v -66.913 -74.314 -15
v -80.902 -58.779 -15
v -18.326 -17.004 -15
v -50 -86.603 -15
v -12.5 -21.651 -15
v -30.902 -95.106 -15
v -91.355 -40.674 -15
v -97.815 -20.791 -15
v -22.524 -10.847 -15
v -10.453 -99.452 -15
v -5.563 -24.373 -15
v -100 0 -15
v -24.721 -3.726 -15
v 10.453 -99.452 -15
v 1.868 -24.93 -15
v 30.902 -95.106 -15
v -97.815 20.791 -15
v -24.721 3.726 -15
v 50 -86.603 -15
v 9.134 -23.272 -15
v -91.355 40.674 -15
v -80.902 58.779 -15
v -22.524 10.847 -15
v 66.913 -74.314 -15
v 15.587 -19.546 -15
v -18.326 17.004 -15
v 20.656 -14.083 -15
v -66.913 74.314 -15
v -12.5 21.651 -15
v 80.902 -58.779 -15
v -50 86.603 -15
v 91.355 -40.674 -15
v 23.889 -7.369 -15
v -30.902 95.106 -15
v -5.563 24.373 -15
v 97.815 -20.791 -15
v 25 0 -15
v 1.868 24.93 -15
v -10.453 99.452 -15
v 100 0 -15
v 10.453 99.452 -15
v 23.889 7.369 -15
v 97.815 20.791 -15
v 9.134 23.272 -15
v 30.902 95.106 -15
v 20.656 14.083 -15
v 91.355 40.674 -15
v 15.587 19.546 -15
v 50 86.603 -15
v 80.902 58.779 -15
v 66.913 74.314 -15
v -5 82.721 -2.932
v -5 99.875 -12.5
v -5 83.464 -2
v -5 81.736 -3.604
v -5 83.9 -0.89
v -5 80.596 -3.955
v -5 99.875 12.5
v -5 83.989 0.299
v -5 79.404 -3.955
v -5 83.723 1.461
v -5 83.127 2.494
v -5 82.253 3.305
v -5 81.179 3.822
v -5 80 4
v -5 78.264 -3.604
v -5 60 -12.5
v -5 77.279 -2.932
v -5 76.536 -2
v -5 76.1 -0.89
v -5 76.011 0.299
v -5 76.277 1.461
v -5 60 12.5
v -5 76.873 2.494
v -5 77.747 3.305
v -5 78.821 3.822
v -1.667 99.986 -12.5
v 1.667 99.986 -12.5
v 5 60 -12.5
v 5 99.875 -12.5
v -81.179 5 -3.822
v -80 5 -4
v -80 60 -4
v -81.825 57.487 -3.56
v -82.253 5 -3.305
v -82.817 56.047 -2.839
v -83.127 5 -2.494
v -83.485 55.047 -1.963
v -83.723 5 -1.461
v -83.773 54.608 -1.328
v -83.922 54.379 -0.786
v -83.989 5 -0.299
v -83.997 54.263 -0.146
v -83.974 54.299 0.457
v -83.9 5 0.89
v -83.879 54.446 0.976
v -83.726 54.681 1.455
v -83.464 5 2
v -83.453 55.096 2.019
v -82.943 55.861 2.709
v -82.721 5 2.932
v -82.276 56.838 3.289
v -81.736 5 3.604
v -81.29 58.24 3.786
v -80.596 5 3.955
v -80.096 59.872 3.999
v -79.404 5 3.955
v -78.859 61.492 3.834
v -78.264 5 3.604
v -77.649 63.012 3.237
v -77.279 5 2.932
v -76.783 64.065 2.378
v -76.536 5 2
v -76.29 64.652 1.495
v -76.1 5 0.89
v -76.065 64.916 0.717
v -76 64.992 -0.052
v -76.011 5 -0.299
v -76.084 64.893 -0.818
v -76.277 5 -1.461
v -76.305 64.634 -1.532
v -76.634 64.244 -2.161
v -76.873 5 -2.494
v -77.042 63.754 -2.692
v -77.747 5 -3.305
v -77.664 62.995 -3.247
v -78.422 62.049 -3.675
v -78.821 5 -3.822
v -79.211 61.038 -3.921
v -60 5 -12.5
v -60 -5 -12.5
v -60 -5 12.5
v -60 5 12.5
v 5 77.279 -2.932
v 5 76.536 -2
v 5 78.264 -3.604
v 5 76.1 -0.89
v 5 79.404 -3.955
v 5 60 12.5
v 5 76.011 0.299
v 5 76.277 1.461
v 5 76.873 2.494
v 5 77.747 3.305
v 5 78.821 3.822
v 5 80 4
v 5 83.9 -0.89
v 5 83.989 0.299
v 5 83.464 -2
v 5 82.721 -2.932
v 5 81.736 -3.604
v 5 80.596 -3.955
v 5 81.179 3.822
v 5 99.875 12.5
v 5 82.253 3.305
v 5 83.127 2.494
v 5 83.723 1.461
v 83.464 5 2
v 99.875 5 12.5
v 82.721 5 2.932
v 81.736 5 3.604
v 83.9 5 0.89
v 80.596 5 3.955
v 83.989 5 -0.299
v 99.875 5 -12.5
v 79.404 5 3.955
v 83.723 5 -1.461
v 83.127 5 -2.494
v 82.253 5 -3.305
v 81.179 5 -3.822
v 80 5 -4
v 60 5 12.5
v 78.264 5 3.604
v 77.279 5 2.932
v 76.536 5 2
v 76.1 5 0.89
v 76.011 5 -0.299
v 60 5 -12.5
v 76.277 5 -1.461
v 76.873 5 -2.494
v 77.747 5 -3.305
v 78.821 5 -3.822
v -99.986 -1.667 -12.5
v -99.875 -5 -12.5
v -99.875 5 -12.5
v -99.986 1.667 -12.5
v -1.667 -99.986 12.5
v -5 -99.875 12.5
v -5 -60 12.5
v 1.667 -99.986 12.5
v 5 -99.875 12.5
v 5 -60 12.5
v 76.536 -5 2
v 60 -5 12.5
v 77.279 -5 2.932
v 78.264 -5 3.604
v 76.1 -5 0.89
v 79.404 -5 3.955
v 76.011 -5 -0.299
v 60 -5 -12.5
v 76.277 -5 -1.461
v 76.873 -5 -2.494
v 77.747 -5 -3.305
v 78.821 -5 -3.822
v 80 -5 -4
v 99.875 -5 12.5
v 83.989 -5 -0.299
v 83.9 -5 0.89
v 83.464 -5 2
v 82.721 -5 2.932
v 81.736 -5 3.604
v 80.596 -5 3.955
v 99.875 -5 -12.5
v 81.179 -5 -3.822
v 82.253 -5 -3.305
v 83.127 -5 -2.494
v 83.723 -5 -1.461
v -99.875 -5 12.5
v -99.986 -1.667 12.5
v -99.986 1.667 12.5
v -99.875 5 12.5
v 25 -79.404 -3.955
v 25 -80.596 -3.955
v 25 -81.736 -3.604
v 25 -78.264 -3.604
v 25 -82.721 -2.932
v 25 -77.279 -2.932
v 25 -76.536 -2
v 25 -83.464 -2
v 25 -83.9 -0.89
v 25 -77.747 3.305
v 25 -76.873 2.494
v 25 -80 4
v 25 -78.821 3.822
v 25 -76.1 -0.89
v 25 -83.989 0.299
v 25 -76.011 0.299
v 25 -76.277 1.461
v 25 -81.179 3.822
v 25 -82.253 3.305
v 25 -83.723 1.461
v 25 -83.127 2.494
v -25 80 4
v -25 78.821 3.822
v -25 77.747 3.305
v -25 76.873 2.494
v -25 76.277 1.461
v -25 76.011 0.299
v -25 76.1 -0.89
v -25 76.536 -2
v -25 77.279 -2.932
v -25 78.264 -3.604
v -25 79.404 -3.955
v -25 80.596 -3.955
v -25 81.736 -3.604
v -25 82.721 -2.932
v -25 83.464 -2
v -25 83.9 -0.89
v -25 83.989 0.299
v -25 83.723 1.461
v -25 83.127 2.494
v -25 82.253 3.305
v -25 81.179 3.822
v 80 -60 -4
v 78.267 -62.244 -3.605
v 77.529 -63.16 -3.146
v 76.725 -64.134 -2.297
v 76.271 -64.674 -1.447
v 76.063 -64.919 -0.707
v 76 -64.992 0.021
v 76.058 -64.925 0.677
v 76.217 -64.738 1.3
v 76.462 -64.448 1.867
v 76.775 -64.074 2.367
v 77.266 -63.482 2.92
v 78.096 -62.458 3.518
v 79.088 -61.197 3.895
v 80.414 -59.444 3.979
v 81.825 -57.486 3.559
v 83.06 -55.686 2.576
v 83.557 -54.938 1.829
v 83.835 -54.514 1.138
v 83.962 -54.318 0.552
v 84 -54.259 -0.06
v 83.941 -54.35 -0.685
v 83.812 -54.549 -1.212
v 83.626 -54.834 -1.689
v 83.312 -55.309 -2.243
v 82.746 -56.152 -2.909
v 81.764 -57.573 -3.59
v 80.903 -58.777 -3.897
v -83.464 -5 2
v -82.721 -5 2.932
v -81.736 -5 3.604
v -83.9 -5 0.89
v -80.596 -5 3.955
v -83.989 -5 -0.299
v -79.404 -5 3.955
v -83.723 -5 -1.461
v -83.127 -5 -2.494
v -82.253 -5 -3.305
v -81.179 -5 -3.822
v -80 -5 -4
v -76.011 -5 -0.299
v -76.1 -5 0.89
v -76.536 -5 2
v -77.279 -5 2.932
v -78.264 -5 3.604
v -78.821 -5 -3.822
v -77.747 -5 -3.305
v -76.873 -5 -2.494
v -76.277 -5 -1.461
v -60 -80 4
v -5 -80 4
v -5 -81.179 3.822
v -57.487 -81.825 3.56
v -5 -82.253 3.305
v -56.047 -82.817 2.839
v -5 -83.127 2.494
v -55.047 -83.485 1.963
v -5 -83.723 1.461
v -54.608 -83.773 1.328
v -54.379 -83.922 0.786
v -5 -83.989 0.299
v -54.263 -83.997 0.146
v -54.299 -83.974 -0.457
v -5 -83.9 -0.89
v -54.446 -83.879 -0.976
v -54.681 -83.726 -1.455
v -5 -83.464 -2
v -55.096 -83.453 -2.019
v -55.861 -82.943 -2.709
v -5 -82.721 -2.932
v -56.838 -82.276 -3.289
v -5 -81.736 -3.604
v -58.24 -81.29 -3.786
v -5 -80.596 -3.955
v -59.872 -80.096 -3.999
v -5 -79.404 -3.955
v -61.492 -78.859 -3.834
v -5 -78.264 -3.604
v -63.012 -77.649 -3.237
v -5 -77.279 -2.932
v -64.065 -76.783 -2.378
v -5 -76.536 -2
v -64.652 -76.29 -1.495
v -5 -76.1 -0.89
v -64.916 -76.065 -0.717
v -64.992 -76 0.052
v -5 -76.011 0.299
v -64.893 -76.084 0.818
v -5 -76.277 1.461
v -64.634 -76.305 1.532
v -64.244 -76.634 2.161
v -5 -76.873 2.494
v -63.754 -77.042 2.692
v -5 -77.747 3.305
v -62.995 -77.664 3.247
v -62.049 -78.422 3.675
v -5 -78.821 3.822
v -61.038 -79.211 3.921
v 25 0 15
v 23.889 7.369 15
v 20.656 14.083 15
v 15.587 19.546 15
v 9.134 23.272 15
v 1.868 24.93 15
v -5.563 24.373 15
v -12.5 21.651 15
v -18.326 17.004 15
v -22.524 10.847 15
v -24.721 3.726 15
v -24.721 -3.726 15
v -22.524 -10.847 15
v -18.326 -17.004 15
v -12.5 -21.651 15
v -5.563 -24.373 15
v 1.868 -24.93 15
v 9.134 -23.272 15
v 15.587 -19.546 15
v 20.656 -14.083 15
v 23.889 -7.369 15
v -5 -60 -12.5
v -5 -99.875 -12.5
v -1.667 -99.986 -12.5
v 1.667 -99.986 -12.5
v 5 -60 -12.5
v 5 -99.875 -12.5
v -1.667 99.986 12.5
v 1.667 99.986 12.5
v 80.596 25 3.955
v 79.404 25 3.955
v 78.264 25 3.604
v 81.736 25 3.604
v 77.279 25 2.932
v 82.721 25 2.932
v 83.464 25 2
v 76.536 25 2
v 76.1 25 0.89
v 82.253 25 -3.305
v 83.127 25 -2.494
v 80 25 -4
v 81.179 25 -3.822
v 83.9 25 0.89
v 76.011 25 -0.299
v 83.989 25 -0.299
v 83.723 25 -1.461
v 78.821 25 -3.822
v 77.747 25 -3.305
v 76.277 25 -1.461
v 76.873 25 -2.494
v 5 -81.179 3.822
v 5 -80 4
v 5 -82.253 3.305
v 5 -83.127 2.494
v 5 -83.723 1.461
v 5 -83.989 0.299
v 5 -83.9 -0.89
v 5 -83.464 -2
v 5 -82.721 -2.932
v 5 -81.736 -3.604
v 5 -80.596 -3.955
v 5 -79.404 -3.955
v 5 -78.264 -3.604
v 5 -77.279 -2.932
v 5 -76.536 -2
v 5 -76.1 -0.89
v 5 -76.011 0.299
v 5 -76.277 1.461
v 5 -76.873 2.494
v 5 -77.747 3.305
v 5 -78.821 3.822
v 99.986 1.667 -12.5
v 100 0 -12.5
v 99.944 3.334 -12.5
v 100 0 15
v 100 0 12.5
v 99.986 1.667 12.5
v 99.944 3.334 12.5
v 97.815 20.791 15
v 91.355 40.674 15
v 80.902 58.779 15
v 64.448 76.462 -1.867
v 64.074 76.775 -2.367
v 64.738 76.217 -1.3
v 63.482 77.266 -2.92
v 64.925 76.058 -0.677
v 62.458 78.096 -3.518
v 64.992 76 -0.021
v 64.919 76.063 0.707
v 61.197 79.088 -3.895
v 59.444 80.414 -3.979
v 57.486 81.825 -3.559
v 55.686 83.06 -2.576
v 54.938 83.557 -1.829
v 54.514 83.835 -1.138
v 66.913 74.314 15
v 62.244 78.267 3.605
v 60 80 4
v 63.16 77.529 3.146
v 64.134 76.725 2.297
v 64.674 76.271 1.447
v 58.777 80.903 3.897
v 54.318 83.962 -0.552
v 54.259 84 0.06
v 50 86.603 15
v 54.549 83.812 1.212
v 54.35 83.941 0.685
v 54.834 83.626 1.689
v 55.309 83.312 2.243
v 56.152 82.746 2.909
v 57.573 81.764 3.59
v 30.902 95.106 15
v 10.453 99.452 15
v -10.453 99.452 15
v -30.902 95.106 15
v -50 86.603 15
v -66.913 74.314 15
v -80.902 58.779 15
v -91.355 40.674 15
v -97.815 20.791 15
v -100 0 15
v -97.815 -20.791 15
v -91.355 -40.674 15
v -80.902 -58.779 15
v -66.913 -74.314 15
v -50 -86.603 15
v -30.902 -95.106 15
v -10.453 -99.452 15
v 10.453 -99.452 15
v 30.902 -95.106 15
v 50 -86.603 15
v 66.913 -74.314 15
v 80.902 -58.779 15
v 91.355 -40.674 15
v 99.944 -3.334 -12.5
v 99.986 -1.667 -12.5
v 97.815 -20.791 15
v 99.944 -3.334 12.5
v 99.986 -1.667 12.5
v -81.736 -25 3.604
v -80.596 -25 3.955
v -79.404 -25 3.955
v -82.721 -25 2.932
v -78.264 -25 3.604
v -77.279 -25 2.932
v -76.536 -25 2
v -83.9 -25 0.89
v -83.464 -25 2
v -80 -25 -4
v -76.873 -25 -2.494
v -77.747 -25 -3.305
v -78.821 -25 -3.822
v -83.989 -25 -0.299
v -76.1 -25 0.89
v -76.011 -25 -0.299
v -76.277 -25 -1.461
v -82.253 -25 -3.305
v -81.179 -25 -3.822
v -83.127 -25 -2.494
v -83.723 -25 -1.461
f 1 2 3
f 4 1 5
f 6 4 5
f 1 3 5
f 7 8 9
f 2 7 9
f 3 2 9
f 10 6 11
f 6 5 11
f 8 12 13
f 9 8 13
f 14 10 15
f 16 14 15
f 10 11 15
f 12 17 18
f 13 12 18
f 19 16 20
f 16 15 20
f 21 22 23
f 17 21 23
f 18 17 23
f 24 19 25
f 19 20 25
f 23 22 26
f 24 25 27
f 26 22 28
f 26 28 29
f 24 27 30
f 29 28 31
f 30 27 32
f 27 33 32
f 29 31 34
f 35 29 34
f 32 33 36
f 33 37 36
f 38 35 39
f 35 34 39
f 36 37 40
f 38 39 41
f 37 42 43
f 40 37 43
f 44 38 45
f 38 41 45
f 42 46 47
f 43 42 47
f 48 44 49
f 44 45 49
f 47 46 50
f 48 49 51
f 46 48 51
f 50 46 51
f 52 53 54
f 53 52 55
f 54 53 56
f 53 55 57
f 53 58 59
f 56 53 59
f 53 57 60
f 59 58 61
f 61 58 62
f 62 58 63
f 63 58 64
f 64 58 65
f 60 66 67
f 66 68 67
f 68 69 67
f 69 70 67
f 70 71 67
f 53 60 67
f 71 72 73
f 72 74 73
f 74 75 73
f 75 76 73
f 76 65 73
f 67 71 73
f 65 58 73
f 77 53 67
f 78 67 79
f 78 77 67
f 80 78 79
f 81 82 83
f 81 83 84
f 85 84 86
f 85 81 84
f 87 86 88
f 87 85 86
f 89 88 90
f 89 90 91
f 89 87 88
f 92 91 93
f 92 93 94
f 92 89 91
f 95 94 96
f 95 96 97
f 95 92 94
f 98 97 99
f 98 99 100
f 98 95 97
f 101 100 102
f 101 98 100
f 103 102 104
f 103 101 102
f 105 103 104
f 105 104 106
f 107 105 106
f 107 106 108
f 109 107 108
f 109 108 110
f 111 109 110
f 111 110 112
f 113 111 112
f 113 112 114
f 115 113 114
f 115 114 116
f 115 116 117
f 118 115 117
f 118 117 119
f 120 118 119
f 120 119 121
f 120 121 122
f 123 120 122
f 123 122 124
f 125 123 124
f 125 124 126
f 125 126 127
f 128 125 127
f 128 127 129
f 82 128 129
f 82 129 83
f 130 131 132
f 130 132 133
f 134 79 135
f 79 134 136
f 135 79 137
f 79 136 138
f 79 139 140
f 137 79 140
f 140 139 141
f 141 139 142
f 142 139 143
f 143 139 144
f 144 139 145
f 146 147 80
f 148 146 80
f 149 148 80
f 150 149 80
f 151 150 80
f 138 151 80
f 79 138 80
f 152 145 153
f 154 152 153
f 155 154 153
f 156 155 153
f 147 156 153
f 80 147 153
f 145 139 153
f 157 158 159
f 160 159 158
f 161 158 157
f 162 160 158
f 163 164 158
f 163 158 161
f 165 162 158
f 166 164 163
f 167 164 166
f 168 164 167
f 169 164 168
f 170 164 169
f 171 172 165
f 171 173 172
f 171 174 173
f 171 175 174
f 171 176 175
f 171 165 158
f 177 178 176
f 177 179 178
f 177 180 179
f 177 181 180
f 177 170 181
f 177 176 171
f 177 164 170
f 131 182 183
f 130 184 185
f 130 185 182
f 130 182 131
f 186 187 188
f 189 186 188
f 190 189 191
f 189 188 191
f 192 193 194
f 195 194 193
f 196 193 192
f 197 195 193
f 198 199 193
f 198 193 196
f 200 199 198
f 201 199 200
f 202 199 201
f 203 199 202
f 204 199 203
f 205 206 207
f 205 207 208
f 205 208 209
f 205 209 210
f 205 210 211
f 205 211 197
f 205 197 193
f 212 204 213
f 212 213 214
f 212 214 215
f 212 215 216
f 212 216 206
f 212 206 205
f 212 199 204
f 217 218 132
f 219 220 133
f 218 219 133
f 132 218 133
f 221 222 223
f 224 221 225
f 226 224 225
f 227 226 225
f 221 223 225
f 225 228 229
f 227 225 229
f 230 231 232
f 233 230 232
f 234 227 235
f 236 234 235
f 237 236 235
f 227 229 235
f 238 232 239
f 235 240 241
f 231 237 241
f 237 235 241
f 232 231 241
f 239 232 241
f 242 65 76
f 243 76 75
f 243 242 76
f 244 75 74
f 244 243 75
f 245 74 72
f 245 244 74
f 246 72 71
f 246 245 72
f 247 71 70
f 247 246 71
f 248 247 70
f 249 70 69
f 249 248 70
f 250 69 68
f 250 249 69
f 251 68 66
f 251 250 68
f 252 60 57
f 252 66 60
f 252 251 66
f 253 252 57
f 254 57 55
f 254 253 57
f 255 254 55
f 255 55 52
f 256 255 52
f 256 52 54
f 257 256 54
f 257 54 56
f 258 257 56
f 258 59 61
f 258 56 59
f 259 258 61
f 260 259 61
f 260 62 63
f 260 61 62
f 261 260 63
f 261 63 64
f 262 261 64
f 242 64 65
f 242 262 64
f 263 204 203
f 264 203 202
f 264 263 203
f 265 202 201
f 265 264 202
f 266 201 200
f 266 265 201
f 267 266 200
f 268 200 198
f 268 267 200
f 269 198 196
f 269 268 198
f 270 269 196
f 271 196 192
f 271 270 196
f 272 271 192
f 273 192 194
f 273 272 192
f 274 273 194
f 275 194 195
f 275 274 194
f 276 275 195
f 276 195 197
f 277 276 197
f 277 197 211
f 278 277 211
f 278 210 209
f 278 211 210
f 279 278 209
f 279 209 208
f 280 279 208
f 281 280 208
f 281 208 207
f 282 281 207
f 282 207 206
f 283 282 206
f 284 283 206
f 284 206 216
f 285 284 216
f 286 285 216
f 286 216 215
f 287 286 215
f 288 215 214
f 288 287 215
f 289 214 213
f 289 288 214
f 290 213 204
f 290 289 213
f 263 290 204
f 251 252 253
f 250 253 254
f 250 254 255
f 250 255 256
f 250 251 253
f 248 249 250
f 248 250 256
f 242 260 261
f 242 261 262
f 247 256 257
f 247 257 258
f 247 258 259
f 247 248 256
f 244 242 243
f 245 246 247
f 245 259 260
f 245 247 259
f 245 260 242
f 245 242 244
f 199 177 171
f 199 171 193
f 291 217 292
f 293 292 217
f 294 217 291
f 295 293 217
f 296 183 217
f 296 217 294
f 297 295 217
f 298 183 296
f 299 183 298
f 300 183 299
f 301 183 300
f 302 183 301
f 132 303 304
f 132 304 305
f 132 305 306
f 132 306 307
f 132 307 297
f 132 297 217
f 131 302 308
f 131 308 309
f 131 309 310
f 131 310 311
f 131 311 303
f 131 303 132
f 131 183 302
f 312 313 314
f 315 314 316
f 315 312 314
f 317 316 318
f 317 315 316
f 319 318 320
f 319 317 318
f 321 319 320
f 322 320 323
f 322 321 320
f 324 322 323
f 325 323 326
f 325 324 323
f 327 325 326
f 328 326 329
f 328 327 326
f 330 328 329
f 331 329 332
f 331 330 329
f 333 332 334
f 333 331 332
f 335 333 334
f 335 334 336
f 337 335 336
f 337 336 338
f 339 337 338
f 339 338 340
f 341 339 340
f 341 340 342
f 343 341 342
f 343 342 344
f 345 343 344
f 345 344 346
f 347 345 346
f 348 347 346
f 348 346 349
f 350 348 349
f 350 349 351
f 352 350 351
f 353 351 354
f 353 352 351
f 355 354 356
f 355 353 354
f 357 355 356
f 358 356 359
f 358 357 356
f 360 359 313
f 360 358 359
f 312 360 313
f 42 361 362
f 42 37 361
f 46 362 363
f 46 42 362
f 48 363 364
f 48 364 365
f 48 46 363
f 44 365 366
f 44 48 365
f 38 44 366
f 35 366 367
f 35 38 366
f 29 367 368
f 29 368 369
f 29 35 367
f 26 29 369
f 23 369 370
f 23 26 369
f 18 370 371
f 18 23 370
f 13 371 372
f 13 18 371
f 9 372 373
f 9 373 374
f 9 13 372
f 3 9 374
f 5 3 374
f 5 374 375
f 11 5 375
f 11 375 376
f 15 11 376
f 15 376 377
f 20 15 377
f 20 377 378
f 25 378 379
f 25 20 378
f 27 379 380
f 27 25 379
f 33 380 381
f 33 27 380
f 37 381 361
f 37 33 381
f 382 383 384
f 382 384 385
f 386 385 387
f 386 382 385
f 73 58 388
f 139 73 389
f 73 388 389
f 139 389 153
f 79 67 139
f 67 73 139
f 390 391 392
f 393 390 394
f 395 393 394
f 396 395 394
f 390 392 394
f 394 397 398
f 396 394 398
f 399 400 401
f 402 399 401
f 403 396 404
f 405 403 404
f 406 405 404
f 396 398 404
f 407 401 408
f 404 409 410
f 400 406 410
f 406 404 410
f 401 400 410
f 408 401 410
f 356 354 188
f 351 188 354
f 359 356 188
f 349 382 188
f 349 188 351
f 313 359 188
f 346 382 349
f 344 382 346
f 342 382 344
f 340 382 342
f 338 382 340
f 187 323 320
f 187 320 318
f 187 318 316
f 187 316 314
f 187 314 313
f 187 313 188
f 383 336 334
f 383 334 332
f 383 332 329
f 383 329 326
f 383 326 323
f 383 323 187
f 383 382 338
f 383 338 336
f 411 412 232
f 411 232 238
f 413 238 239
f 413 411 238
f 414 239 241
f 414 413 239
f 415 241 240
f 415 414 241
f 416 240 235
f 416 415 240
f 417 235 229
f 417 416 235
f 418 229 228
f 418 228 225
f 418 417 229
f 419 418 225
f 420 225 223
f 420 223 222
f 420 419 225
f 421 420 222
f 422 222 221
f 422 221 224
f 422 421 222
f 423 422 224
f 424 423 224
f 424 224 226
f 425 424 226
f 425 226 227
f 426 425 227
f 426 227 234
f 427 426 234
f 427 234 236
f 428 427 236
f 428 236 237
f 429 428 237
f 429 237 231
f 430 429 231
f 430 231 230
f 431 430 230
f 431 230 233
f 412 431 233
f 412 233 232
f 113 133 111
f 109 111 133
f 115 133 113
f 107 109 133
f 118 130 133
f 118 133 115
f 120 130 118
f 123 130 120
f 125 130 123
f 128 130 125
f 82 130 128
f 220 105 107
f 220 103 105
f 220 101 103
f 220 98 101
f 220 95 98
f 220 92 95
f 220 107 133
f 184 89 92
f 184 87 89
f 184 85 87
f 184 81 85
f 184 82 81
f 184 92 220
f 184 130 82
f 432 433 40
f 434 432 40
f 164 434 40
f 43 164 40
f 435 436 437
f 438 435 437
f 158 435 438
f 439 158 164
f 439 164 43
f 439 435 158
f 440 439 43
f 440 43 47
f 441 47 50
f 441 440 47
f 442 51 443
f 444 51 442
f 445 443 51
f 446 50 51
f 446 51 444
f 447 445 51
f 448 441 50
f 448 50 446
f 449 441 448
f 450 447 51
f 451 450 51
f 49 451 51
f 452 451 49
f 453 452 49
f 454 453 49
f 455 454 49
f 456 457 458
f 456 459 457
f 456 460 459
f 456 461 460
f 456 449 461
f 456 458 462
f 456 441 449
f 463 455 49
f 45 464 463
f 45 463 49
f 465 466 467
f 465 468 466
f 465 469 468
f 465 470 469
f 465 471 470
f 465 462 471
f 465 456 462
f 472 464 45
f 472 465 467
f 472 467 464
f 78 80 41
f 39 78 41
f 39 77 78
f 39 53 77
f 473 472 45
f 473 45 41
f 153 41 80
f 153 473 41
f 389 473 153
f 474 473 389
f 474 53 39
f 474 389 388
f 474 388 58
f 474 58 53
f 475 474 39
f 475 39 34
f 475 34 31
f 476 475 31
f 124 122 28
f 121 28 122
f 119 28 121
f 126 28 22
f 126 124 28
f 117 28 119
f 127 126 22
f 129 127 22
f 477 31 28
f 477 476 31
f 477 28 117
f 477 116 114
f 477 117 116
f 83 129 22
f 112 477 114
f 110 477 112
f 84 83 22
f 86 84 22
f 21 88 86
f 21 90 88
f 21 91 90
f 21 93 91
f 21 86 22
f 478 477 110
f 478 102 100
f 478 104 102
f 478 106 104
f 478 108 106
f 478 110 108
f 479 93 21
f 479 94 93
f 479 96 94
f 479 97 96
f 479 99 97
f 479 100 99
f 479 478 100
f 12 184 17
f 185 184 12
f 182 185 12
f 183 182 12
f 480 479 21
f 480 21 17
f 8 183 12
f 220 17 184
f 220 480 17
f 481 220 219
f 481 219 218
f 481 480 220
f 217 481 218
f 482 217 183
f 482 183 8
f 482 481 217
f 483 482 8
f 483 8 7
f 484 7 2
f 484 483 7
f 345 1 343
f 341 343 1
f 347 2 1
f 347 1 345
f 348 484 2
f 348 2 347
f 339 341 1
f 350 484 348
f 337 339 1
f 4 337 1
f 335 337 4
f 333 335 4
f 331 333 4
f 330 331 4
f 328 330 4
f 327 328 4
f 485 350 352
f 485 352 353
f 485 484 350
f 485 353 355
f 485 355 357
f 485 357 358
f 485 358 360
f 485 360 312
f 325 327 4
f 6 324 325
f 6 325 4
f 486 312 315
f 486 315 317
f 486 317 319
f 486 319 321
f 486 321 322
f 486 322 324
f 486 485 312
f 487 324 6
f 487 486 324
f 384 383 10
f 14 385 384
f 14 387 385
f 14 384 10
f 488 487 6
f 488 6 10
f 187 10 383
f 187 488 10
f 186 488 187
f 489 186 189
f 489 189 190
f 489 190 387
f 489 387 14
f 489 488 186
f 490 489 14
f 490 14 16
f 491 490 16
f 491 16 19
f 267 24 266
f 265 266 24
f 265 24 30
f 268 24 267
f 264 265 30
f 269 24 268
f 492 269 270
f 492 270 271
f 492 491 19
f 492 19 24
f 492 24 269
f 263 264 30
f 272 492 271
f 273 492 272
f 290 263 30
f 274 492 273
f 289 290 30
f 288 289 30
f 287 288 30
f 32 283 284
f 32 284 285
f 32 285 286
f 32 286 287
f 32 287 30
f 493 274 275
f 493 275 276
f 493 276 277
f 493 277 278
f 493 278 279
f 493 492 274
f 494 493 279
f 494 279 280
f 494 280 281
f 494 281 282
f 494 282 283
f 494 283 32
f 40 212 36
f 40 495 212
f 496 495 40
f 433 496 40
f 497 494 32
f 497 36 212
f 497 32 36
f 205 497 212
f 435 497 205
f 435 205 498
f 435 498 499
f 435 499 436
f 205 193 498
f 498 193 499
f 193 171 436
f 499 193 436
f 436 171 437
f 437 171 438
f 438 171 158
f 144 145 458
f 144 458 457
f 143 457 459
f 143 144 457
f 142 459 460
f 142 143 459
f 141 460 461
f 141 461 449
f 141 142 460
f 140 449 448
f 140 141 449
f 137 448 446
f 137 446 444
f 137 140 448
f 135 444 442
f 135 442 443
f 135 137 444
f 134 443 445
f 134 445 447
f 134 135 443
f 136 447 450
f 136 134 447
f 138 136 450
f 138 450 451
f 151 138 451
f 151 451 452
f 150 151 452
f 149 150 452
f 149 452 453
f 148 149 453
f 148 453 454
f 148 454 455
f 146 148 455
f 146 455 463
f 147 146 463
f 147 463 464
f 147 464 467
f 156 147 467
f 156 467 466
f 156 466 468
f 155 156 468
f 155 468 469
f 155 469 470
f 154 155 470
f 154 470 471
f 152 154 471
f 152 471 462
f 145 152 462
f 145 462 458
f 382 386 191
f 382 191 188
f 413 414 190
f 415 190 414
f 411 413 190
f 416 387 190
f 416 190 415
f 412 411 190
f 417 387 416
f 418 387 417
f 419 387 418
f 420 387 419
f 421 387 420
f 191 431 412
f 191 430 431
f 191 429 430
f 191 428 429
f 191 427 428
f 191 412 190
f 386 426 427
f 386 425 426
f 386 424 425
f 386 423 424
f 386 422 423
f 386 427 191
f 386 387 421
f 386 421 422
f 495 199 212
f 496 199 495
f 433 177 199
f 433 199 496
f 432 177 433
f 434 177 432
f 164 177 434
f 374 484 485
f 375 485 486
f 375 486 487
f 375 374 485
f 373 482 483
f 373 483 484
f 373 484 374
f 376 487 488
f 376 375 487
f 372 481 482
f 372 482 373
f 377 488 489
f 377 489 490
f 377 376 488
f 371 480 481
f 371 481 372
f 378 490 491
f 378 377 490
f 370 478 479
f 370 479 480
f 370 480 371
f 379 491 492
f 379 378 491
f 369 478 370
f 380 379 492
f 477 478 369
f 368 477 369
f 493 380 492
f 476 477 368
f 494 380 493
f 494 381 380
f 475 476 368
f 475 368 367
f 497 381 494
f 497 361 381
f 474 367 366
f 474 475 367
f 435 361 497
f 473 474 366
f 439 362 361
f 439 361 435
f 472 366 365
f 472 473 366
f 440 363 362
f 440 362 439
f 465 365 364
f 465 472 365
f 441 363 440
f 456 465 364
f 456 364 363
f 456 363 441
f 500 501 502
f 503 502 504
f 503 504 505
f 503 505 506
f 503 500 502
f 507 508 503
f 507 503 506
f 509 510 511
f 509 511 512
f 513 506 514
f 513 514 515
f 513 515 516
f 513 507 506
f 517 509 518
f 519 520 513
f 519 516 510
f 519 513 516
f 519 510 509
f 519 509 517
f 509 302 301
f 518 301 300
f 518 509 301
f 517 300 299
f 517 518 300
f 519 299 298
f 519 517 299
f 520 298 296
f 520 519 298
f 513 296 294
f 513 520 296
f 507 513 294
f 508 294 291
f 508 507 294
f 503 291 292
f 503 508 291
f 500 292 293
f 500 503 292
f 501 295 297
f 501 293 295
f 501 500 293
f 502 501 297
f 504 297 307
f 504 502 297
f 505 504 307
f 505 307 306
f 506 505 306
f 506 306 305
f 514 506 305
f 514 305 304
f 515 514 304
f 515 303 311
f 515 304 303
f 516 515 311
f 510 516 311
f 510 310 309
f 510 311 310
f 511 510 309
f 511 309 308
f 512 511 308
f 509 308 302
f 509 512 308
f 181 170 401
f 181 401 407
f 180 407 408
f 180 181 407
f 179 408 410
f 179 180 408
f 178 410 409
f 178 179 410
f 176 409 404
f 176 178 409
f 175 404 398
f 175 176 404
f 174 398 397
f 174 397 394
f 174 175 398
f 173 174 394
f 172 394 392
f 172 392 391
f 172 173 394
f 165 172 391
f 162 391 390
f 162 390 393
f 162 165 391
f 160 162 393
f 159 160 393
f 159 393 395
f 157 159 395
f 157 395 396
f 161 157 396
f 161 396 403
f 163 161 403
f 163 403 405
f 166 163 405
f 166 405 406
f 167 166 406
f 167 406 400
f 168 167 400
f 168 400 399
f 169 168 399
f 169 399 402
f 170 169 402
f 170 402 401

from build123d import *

# Parameters (mm, degrees)
SKETCH1_R               = 100
SKETCH1_R_2             = 25
BOSS_EXTRUDE1_DEPTH     = 15
CUT_EXTRUDE1_DEPTH      = 12.5
CUT_EXTRUDE2_DEPTH      = 25
CUT_EXTRUDE2_DEPTH_BACK = 100
SKETCH3_R               = 4
CUT_EXTRUDE3_DEPTH      = 100
CUT_EXTRUDE3_DEPTH_BACK = 25
SKETCH4_R               = 4
CUT_EXTRUDE4_DEPTH      = 25
CUT_EXTRUDE4_DEPTH_BACK = 100
SKETCH5_R               = 4
CUT_EXTRUDE5_DEPTH      = 100
CUT_EXTRUDE5_DEPTH_BACK = 25
SKETCH6_R               = 4


with BuildPart() as part:
    # Sketch1 → Boss-Extrude1 (new, symmetric)
    with BuildSketch(Plane.XY):
        Circle(SKETCH1_R)
        Circle(SKETCH1_R_2, mode=Mode.SUBTRACT)
    extrude(amount=BOSS_EXTRUDE1_DEPTH, both=True)

    # Sketch2 → Cut-Extrude1 (cut, symmetric)
    with BuildSketch(Plane.XY):
        Polygon((60, -5), (110, -5), (100, 5), (60, 5), align=None)
        Polygon((-5, -60), (-5, -110), (5, -100), (5, -60), align=None)
        Polygon((-60, 5), (-110, 5), (-100, -5), (-60, -5), align=None)
        Polygon((5, 60), (5, 110), (-5, 100), (-5, 60), align=None)
    extrude(amount=CUT_EXTRUDE1_DEPTH, both=True, mode=Mode.SUBTRACT)

    # Sketch3 → Cut-Extrude2 (cut, two sides: drawn at the far end of the back side and taken through both)
    with BuildSketch(Plane(origin=(0, 0, 0), x_dir=(1, 0, 0), z_dir=(0, 1, 0)).offset(-CUT_EXTRUDE2_DEPTH_BACK)):
        with Locations(Location((80, 0, 0), (0, 0, 90))):
            Circle(SKETCH3_R)
    extrude(amount=CUT_EXTRUDE2_DEPTH + CUT_EXTRUDE2_DEPTH_BACK, mode=Mode.SUBTRACT)

    # Sketch4 → Cut-Extrude3 (cut, two sides: drawn at the far end of the back side and taken through both)
    with BuildSketch(Plane(origin=(0, 0, 0), x_dir=(0, 0, -1), z_dir=(1, 0, 0)).offset(-CUT_EXTRUDE3_DEPTH_BACK)):
        with Locations(Location((0, 80, 0), (0, 0, 180))):
            Circle(SKETCH4_R)
    extrude(amount=CUT_EXTRUDE3_DEPTH + CUT_EXTRUDE3_DEPTH_BACK, mode=Mode.SUBTRACT)

    # Sketch5 → Cut-Extrude4 (cut, two sides: drawn at the far end of the back side and taken through both)
    with BuildSketch(Plane(origin=(0, 0, 0), x_dir=(0, 0, -1), z_dir=(1, 0, 0)).offset(-CUT_EXTRUDE4_DEPTH_BACK)):
        with Locations(Location((0, -80, 0), (0, 0, 180))):
            Circle(SKETCH5_R)
    extrude(amount=CUT_EXTRUDE4_DEPTH + CUT_EXTRUDE4_DEPTH_BACK, mode=Mode.SUBTRACT)

    # Sketch6 → Cut-Extrude5 (cut, two sides: drawn at the far end of the back side and taken through both)
    with BuildSketch(Plane(origin=(0, 0, 0), x_dir=(1, 0, 0), z_dir=(0, 1, 0)).offset(-CUT_EXTRUDE5_DEPTH_BACK)):
        with Locations(Location((-80, 0, 0), (0, 0, 90))):
            Circle(SKETCH6_R)
    extrude(amount=CUT_EXTRUDE5_DEPTH + CUT_EXTRUDE5_DEPTH_BACK, mode=Mode.SUBTRACT)


solid = part.part
